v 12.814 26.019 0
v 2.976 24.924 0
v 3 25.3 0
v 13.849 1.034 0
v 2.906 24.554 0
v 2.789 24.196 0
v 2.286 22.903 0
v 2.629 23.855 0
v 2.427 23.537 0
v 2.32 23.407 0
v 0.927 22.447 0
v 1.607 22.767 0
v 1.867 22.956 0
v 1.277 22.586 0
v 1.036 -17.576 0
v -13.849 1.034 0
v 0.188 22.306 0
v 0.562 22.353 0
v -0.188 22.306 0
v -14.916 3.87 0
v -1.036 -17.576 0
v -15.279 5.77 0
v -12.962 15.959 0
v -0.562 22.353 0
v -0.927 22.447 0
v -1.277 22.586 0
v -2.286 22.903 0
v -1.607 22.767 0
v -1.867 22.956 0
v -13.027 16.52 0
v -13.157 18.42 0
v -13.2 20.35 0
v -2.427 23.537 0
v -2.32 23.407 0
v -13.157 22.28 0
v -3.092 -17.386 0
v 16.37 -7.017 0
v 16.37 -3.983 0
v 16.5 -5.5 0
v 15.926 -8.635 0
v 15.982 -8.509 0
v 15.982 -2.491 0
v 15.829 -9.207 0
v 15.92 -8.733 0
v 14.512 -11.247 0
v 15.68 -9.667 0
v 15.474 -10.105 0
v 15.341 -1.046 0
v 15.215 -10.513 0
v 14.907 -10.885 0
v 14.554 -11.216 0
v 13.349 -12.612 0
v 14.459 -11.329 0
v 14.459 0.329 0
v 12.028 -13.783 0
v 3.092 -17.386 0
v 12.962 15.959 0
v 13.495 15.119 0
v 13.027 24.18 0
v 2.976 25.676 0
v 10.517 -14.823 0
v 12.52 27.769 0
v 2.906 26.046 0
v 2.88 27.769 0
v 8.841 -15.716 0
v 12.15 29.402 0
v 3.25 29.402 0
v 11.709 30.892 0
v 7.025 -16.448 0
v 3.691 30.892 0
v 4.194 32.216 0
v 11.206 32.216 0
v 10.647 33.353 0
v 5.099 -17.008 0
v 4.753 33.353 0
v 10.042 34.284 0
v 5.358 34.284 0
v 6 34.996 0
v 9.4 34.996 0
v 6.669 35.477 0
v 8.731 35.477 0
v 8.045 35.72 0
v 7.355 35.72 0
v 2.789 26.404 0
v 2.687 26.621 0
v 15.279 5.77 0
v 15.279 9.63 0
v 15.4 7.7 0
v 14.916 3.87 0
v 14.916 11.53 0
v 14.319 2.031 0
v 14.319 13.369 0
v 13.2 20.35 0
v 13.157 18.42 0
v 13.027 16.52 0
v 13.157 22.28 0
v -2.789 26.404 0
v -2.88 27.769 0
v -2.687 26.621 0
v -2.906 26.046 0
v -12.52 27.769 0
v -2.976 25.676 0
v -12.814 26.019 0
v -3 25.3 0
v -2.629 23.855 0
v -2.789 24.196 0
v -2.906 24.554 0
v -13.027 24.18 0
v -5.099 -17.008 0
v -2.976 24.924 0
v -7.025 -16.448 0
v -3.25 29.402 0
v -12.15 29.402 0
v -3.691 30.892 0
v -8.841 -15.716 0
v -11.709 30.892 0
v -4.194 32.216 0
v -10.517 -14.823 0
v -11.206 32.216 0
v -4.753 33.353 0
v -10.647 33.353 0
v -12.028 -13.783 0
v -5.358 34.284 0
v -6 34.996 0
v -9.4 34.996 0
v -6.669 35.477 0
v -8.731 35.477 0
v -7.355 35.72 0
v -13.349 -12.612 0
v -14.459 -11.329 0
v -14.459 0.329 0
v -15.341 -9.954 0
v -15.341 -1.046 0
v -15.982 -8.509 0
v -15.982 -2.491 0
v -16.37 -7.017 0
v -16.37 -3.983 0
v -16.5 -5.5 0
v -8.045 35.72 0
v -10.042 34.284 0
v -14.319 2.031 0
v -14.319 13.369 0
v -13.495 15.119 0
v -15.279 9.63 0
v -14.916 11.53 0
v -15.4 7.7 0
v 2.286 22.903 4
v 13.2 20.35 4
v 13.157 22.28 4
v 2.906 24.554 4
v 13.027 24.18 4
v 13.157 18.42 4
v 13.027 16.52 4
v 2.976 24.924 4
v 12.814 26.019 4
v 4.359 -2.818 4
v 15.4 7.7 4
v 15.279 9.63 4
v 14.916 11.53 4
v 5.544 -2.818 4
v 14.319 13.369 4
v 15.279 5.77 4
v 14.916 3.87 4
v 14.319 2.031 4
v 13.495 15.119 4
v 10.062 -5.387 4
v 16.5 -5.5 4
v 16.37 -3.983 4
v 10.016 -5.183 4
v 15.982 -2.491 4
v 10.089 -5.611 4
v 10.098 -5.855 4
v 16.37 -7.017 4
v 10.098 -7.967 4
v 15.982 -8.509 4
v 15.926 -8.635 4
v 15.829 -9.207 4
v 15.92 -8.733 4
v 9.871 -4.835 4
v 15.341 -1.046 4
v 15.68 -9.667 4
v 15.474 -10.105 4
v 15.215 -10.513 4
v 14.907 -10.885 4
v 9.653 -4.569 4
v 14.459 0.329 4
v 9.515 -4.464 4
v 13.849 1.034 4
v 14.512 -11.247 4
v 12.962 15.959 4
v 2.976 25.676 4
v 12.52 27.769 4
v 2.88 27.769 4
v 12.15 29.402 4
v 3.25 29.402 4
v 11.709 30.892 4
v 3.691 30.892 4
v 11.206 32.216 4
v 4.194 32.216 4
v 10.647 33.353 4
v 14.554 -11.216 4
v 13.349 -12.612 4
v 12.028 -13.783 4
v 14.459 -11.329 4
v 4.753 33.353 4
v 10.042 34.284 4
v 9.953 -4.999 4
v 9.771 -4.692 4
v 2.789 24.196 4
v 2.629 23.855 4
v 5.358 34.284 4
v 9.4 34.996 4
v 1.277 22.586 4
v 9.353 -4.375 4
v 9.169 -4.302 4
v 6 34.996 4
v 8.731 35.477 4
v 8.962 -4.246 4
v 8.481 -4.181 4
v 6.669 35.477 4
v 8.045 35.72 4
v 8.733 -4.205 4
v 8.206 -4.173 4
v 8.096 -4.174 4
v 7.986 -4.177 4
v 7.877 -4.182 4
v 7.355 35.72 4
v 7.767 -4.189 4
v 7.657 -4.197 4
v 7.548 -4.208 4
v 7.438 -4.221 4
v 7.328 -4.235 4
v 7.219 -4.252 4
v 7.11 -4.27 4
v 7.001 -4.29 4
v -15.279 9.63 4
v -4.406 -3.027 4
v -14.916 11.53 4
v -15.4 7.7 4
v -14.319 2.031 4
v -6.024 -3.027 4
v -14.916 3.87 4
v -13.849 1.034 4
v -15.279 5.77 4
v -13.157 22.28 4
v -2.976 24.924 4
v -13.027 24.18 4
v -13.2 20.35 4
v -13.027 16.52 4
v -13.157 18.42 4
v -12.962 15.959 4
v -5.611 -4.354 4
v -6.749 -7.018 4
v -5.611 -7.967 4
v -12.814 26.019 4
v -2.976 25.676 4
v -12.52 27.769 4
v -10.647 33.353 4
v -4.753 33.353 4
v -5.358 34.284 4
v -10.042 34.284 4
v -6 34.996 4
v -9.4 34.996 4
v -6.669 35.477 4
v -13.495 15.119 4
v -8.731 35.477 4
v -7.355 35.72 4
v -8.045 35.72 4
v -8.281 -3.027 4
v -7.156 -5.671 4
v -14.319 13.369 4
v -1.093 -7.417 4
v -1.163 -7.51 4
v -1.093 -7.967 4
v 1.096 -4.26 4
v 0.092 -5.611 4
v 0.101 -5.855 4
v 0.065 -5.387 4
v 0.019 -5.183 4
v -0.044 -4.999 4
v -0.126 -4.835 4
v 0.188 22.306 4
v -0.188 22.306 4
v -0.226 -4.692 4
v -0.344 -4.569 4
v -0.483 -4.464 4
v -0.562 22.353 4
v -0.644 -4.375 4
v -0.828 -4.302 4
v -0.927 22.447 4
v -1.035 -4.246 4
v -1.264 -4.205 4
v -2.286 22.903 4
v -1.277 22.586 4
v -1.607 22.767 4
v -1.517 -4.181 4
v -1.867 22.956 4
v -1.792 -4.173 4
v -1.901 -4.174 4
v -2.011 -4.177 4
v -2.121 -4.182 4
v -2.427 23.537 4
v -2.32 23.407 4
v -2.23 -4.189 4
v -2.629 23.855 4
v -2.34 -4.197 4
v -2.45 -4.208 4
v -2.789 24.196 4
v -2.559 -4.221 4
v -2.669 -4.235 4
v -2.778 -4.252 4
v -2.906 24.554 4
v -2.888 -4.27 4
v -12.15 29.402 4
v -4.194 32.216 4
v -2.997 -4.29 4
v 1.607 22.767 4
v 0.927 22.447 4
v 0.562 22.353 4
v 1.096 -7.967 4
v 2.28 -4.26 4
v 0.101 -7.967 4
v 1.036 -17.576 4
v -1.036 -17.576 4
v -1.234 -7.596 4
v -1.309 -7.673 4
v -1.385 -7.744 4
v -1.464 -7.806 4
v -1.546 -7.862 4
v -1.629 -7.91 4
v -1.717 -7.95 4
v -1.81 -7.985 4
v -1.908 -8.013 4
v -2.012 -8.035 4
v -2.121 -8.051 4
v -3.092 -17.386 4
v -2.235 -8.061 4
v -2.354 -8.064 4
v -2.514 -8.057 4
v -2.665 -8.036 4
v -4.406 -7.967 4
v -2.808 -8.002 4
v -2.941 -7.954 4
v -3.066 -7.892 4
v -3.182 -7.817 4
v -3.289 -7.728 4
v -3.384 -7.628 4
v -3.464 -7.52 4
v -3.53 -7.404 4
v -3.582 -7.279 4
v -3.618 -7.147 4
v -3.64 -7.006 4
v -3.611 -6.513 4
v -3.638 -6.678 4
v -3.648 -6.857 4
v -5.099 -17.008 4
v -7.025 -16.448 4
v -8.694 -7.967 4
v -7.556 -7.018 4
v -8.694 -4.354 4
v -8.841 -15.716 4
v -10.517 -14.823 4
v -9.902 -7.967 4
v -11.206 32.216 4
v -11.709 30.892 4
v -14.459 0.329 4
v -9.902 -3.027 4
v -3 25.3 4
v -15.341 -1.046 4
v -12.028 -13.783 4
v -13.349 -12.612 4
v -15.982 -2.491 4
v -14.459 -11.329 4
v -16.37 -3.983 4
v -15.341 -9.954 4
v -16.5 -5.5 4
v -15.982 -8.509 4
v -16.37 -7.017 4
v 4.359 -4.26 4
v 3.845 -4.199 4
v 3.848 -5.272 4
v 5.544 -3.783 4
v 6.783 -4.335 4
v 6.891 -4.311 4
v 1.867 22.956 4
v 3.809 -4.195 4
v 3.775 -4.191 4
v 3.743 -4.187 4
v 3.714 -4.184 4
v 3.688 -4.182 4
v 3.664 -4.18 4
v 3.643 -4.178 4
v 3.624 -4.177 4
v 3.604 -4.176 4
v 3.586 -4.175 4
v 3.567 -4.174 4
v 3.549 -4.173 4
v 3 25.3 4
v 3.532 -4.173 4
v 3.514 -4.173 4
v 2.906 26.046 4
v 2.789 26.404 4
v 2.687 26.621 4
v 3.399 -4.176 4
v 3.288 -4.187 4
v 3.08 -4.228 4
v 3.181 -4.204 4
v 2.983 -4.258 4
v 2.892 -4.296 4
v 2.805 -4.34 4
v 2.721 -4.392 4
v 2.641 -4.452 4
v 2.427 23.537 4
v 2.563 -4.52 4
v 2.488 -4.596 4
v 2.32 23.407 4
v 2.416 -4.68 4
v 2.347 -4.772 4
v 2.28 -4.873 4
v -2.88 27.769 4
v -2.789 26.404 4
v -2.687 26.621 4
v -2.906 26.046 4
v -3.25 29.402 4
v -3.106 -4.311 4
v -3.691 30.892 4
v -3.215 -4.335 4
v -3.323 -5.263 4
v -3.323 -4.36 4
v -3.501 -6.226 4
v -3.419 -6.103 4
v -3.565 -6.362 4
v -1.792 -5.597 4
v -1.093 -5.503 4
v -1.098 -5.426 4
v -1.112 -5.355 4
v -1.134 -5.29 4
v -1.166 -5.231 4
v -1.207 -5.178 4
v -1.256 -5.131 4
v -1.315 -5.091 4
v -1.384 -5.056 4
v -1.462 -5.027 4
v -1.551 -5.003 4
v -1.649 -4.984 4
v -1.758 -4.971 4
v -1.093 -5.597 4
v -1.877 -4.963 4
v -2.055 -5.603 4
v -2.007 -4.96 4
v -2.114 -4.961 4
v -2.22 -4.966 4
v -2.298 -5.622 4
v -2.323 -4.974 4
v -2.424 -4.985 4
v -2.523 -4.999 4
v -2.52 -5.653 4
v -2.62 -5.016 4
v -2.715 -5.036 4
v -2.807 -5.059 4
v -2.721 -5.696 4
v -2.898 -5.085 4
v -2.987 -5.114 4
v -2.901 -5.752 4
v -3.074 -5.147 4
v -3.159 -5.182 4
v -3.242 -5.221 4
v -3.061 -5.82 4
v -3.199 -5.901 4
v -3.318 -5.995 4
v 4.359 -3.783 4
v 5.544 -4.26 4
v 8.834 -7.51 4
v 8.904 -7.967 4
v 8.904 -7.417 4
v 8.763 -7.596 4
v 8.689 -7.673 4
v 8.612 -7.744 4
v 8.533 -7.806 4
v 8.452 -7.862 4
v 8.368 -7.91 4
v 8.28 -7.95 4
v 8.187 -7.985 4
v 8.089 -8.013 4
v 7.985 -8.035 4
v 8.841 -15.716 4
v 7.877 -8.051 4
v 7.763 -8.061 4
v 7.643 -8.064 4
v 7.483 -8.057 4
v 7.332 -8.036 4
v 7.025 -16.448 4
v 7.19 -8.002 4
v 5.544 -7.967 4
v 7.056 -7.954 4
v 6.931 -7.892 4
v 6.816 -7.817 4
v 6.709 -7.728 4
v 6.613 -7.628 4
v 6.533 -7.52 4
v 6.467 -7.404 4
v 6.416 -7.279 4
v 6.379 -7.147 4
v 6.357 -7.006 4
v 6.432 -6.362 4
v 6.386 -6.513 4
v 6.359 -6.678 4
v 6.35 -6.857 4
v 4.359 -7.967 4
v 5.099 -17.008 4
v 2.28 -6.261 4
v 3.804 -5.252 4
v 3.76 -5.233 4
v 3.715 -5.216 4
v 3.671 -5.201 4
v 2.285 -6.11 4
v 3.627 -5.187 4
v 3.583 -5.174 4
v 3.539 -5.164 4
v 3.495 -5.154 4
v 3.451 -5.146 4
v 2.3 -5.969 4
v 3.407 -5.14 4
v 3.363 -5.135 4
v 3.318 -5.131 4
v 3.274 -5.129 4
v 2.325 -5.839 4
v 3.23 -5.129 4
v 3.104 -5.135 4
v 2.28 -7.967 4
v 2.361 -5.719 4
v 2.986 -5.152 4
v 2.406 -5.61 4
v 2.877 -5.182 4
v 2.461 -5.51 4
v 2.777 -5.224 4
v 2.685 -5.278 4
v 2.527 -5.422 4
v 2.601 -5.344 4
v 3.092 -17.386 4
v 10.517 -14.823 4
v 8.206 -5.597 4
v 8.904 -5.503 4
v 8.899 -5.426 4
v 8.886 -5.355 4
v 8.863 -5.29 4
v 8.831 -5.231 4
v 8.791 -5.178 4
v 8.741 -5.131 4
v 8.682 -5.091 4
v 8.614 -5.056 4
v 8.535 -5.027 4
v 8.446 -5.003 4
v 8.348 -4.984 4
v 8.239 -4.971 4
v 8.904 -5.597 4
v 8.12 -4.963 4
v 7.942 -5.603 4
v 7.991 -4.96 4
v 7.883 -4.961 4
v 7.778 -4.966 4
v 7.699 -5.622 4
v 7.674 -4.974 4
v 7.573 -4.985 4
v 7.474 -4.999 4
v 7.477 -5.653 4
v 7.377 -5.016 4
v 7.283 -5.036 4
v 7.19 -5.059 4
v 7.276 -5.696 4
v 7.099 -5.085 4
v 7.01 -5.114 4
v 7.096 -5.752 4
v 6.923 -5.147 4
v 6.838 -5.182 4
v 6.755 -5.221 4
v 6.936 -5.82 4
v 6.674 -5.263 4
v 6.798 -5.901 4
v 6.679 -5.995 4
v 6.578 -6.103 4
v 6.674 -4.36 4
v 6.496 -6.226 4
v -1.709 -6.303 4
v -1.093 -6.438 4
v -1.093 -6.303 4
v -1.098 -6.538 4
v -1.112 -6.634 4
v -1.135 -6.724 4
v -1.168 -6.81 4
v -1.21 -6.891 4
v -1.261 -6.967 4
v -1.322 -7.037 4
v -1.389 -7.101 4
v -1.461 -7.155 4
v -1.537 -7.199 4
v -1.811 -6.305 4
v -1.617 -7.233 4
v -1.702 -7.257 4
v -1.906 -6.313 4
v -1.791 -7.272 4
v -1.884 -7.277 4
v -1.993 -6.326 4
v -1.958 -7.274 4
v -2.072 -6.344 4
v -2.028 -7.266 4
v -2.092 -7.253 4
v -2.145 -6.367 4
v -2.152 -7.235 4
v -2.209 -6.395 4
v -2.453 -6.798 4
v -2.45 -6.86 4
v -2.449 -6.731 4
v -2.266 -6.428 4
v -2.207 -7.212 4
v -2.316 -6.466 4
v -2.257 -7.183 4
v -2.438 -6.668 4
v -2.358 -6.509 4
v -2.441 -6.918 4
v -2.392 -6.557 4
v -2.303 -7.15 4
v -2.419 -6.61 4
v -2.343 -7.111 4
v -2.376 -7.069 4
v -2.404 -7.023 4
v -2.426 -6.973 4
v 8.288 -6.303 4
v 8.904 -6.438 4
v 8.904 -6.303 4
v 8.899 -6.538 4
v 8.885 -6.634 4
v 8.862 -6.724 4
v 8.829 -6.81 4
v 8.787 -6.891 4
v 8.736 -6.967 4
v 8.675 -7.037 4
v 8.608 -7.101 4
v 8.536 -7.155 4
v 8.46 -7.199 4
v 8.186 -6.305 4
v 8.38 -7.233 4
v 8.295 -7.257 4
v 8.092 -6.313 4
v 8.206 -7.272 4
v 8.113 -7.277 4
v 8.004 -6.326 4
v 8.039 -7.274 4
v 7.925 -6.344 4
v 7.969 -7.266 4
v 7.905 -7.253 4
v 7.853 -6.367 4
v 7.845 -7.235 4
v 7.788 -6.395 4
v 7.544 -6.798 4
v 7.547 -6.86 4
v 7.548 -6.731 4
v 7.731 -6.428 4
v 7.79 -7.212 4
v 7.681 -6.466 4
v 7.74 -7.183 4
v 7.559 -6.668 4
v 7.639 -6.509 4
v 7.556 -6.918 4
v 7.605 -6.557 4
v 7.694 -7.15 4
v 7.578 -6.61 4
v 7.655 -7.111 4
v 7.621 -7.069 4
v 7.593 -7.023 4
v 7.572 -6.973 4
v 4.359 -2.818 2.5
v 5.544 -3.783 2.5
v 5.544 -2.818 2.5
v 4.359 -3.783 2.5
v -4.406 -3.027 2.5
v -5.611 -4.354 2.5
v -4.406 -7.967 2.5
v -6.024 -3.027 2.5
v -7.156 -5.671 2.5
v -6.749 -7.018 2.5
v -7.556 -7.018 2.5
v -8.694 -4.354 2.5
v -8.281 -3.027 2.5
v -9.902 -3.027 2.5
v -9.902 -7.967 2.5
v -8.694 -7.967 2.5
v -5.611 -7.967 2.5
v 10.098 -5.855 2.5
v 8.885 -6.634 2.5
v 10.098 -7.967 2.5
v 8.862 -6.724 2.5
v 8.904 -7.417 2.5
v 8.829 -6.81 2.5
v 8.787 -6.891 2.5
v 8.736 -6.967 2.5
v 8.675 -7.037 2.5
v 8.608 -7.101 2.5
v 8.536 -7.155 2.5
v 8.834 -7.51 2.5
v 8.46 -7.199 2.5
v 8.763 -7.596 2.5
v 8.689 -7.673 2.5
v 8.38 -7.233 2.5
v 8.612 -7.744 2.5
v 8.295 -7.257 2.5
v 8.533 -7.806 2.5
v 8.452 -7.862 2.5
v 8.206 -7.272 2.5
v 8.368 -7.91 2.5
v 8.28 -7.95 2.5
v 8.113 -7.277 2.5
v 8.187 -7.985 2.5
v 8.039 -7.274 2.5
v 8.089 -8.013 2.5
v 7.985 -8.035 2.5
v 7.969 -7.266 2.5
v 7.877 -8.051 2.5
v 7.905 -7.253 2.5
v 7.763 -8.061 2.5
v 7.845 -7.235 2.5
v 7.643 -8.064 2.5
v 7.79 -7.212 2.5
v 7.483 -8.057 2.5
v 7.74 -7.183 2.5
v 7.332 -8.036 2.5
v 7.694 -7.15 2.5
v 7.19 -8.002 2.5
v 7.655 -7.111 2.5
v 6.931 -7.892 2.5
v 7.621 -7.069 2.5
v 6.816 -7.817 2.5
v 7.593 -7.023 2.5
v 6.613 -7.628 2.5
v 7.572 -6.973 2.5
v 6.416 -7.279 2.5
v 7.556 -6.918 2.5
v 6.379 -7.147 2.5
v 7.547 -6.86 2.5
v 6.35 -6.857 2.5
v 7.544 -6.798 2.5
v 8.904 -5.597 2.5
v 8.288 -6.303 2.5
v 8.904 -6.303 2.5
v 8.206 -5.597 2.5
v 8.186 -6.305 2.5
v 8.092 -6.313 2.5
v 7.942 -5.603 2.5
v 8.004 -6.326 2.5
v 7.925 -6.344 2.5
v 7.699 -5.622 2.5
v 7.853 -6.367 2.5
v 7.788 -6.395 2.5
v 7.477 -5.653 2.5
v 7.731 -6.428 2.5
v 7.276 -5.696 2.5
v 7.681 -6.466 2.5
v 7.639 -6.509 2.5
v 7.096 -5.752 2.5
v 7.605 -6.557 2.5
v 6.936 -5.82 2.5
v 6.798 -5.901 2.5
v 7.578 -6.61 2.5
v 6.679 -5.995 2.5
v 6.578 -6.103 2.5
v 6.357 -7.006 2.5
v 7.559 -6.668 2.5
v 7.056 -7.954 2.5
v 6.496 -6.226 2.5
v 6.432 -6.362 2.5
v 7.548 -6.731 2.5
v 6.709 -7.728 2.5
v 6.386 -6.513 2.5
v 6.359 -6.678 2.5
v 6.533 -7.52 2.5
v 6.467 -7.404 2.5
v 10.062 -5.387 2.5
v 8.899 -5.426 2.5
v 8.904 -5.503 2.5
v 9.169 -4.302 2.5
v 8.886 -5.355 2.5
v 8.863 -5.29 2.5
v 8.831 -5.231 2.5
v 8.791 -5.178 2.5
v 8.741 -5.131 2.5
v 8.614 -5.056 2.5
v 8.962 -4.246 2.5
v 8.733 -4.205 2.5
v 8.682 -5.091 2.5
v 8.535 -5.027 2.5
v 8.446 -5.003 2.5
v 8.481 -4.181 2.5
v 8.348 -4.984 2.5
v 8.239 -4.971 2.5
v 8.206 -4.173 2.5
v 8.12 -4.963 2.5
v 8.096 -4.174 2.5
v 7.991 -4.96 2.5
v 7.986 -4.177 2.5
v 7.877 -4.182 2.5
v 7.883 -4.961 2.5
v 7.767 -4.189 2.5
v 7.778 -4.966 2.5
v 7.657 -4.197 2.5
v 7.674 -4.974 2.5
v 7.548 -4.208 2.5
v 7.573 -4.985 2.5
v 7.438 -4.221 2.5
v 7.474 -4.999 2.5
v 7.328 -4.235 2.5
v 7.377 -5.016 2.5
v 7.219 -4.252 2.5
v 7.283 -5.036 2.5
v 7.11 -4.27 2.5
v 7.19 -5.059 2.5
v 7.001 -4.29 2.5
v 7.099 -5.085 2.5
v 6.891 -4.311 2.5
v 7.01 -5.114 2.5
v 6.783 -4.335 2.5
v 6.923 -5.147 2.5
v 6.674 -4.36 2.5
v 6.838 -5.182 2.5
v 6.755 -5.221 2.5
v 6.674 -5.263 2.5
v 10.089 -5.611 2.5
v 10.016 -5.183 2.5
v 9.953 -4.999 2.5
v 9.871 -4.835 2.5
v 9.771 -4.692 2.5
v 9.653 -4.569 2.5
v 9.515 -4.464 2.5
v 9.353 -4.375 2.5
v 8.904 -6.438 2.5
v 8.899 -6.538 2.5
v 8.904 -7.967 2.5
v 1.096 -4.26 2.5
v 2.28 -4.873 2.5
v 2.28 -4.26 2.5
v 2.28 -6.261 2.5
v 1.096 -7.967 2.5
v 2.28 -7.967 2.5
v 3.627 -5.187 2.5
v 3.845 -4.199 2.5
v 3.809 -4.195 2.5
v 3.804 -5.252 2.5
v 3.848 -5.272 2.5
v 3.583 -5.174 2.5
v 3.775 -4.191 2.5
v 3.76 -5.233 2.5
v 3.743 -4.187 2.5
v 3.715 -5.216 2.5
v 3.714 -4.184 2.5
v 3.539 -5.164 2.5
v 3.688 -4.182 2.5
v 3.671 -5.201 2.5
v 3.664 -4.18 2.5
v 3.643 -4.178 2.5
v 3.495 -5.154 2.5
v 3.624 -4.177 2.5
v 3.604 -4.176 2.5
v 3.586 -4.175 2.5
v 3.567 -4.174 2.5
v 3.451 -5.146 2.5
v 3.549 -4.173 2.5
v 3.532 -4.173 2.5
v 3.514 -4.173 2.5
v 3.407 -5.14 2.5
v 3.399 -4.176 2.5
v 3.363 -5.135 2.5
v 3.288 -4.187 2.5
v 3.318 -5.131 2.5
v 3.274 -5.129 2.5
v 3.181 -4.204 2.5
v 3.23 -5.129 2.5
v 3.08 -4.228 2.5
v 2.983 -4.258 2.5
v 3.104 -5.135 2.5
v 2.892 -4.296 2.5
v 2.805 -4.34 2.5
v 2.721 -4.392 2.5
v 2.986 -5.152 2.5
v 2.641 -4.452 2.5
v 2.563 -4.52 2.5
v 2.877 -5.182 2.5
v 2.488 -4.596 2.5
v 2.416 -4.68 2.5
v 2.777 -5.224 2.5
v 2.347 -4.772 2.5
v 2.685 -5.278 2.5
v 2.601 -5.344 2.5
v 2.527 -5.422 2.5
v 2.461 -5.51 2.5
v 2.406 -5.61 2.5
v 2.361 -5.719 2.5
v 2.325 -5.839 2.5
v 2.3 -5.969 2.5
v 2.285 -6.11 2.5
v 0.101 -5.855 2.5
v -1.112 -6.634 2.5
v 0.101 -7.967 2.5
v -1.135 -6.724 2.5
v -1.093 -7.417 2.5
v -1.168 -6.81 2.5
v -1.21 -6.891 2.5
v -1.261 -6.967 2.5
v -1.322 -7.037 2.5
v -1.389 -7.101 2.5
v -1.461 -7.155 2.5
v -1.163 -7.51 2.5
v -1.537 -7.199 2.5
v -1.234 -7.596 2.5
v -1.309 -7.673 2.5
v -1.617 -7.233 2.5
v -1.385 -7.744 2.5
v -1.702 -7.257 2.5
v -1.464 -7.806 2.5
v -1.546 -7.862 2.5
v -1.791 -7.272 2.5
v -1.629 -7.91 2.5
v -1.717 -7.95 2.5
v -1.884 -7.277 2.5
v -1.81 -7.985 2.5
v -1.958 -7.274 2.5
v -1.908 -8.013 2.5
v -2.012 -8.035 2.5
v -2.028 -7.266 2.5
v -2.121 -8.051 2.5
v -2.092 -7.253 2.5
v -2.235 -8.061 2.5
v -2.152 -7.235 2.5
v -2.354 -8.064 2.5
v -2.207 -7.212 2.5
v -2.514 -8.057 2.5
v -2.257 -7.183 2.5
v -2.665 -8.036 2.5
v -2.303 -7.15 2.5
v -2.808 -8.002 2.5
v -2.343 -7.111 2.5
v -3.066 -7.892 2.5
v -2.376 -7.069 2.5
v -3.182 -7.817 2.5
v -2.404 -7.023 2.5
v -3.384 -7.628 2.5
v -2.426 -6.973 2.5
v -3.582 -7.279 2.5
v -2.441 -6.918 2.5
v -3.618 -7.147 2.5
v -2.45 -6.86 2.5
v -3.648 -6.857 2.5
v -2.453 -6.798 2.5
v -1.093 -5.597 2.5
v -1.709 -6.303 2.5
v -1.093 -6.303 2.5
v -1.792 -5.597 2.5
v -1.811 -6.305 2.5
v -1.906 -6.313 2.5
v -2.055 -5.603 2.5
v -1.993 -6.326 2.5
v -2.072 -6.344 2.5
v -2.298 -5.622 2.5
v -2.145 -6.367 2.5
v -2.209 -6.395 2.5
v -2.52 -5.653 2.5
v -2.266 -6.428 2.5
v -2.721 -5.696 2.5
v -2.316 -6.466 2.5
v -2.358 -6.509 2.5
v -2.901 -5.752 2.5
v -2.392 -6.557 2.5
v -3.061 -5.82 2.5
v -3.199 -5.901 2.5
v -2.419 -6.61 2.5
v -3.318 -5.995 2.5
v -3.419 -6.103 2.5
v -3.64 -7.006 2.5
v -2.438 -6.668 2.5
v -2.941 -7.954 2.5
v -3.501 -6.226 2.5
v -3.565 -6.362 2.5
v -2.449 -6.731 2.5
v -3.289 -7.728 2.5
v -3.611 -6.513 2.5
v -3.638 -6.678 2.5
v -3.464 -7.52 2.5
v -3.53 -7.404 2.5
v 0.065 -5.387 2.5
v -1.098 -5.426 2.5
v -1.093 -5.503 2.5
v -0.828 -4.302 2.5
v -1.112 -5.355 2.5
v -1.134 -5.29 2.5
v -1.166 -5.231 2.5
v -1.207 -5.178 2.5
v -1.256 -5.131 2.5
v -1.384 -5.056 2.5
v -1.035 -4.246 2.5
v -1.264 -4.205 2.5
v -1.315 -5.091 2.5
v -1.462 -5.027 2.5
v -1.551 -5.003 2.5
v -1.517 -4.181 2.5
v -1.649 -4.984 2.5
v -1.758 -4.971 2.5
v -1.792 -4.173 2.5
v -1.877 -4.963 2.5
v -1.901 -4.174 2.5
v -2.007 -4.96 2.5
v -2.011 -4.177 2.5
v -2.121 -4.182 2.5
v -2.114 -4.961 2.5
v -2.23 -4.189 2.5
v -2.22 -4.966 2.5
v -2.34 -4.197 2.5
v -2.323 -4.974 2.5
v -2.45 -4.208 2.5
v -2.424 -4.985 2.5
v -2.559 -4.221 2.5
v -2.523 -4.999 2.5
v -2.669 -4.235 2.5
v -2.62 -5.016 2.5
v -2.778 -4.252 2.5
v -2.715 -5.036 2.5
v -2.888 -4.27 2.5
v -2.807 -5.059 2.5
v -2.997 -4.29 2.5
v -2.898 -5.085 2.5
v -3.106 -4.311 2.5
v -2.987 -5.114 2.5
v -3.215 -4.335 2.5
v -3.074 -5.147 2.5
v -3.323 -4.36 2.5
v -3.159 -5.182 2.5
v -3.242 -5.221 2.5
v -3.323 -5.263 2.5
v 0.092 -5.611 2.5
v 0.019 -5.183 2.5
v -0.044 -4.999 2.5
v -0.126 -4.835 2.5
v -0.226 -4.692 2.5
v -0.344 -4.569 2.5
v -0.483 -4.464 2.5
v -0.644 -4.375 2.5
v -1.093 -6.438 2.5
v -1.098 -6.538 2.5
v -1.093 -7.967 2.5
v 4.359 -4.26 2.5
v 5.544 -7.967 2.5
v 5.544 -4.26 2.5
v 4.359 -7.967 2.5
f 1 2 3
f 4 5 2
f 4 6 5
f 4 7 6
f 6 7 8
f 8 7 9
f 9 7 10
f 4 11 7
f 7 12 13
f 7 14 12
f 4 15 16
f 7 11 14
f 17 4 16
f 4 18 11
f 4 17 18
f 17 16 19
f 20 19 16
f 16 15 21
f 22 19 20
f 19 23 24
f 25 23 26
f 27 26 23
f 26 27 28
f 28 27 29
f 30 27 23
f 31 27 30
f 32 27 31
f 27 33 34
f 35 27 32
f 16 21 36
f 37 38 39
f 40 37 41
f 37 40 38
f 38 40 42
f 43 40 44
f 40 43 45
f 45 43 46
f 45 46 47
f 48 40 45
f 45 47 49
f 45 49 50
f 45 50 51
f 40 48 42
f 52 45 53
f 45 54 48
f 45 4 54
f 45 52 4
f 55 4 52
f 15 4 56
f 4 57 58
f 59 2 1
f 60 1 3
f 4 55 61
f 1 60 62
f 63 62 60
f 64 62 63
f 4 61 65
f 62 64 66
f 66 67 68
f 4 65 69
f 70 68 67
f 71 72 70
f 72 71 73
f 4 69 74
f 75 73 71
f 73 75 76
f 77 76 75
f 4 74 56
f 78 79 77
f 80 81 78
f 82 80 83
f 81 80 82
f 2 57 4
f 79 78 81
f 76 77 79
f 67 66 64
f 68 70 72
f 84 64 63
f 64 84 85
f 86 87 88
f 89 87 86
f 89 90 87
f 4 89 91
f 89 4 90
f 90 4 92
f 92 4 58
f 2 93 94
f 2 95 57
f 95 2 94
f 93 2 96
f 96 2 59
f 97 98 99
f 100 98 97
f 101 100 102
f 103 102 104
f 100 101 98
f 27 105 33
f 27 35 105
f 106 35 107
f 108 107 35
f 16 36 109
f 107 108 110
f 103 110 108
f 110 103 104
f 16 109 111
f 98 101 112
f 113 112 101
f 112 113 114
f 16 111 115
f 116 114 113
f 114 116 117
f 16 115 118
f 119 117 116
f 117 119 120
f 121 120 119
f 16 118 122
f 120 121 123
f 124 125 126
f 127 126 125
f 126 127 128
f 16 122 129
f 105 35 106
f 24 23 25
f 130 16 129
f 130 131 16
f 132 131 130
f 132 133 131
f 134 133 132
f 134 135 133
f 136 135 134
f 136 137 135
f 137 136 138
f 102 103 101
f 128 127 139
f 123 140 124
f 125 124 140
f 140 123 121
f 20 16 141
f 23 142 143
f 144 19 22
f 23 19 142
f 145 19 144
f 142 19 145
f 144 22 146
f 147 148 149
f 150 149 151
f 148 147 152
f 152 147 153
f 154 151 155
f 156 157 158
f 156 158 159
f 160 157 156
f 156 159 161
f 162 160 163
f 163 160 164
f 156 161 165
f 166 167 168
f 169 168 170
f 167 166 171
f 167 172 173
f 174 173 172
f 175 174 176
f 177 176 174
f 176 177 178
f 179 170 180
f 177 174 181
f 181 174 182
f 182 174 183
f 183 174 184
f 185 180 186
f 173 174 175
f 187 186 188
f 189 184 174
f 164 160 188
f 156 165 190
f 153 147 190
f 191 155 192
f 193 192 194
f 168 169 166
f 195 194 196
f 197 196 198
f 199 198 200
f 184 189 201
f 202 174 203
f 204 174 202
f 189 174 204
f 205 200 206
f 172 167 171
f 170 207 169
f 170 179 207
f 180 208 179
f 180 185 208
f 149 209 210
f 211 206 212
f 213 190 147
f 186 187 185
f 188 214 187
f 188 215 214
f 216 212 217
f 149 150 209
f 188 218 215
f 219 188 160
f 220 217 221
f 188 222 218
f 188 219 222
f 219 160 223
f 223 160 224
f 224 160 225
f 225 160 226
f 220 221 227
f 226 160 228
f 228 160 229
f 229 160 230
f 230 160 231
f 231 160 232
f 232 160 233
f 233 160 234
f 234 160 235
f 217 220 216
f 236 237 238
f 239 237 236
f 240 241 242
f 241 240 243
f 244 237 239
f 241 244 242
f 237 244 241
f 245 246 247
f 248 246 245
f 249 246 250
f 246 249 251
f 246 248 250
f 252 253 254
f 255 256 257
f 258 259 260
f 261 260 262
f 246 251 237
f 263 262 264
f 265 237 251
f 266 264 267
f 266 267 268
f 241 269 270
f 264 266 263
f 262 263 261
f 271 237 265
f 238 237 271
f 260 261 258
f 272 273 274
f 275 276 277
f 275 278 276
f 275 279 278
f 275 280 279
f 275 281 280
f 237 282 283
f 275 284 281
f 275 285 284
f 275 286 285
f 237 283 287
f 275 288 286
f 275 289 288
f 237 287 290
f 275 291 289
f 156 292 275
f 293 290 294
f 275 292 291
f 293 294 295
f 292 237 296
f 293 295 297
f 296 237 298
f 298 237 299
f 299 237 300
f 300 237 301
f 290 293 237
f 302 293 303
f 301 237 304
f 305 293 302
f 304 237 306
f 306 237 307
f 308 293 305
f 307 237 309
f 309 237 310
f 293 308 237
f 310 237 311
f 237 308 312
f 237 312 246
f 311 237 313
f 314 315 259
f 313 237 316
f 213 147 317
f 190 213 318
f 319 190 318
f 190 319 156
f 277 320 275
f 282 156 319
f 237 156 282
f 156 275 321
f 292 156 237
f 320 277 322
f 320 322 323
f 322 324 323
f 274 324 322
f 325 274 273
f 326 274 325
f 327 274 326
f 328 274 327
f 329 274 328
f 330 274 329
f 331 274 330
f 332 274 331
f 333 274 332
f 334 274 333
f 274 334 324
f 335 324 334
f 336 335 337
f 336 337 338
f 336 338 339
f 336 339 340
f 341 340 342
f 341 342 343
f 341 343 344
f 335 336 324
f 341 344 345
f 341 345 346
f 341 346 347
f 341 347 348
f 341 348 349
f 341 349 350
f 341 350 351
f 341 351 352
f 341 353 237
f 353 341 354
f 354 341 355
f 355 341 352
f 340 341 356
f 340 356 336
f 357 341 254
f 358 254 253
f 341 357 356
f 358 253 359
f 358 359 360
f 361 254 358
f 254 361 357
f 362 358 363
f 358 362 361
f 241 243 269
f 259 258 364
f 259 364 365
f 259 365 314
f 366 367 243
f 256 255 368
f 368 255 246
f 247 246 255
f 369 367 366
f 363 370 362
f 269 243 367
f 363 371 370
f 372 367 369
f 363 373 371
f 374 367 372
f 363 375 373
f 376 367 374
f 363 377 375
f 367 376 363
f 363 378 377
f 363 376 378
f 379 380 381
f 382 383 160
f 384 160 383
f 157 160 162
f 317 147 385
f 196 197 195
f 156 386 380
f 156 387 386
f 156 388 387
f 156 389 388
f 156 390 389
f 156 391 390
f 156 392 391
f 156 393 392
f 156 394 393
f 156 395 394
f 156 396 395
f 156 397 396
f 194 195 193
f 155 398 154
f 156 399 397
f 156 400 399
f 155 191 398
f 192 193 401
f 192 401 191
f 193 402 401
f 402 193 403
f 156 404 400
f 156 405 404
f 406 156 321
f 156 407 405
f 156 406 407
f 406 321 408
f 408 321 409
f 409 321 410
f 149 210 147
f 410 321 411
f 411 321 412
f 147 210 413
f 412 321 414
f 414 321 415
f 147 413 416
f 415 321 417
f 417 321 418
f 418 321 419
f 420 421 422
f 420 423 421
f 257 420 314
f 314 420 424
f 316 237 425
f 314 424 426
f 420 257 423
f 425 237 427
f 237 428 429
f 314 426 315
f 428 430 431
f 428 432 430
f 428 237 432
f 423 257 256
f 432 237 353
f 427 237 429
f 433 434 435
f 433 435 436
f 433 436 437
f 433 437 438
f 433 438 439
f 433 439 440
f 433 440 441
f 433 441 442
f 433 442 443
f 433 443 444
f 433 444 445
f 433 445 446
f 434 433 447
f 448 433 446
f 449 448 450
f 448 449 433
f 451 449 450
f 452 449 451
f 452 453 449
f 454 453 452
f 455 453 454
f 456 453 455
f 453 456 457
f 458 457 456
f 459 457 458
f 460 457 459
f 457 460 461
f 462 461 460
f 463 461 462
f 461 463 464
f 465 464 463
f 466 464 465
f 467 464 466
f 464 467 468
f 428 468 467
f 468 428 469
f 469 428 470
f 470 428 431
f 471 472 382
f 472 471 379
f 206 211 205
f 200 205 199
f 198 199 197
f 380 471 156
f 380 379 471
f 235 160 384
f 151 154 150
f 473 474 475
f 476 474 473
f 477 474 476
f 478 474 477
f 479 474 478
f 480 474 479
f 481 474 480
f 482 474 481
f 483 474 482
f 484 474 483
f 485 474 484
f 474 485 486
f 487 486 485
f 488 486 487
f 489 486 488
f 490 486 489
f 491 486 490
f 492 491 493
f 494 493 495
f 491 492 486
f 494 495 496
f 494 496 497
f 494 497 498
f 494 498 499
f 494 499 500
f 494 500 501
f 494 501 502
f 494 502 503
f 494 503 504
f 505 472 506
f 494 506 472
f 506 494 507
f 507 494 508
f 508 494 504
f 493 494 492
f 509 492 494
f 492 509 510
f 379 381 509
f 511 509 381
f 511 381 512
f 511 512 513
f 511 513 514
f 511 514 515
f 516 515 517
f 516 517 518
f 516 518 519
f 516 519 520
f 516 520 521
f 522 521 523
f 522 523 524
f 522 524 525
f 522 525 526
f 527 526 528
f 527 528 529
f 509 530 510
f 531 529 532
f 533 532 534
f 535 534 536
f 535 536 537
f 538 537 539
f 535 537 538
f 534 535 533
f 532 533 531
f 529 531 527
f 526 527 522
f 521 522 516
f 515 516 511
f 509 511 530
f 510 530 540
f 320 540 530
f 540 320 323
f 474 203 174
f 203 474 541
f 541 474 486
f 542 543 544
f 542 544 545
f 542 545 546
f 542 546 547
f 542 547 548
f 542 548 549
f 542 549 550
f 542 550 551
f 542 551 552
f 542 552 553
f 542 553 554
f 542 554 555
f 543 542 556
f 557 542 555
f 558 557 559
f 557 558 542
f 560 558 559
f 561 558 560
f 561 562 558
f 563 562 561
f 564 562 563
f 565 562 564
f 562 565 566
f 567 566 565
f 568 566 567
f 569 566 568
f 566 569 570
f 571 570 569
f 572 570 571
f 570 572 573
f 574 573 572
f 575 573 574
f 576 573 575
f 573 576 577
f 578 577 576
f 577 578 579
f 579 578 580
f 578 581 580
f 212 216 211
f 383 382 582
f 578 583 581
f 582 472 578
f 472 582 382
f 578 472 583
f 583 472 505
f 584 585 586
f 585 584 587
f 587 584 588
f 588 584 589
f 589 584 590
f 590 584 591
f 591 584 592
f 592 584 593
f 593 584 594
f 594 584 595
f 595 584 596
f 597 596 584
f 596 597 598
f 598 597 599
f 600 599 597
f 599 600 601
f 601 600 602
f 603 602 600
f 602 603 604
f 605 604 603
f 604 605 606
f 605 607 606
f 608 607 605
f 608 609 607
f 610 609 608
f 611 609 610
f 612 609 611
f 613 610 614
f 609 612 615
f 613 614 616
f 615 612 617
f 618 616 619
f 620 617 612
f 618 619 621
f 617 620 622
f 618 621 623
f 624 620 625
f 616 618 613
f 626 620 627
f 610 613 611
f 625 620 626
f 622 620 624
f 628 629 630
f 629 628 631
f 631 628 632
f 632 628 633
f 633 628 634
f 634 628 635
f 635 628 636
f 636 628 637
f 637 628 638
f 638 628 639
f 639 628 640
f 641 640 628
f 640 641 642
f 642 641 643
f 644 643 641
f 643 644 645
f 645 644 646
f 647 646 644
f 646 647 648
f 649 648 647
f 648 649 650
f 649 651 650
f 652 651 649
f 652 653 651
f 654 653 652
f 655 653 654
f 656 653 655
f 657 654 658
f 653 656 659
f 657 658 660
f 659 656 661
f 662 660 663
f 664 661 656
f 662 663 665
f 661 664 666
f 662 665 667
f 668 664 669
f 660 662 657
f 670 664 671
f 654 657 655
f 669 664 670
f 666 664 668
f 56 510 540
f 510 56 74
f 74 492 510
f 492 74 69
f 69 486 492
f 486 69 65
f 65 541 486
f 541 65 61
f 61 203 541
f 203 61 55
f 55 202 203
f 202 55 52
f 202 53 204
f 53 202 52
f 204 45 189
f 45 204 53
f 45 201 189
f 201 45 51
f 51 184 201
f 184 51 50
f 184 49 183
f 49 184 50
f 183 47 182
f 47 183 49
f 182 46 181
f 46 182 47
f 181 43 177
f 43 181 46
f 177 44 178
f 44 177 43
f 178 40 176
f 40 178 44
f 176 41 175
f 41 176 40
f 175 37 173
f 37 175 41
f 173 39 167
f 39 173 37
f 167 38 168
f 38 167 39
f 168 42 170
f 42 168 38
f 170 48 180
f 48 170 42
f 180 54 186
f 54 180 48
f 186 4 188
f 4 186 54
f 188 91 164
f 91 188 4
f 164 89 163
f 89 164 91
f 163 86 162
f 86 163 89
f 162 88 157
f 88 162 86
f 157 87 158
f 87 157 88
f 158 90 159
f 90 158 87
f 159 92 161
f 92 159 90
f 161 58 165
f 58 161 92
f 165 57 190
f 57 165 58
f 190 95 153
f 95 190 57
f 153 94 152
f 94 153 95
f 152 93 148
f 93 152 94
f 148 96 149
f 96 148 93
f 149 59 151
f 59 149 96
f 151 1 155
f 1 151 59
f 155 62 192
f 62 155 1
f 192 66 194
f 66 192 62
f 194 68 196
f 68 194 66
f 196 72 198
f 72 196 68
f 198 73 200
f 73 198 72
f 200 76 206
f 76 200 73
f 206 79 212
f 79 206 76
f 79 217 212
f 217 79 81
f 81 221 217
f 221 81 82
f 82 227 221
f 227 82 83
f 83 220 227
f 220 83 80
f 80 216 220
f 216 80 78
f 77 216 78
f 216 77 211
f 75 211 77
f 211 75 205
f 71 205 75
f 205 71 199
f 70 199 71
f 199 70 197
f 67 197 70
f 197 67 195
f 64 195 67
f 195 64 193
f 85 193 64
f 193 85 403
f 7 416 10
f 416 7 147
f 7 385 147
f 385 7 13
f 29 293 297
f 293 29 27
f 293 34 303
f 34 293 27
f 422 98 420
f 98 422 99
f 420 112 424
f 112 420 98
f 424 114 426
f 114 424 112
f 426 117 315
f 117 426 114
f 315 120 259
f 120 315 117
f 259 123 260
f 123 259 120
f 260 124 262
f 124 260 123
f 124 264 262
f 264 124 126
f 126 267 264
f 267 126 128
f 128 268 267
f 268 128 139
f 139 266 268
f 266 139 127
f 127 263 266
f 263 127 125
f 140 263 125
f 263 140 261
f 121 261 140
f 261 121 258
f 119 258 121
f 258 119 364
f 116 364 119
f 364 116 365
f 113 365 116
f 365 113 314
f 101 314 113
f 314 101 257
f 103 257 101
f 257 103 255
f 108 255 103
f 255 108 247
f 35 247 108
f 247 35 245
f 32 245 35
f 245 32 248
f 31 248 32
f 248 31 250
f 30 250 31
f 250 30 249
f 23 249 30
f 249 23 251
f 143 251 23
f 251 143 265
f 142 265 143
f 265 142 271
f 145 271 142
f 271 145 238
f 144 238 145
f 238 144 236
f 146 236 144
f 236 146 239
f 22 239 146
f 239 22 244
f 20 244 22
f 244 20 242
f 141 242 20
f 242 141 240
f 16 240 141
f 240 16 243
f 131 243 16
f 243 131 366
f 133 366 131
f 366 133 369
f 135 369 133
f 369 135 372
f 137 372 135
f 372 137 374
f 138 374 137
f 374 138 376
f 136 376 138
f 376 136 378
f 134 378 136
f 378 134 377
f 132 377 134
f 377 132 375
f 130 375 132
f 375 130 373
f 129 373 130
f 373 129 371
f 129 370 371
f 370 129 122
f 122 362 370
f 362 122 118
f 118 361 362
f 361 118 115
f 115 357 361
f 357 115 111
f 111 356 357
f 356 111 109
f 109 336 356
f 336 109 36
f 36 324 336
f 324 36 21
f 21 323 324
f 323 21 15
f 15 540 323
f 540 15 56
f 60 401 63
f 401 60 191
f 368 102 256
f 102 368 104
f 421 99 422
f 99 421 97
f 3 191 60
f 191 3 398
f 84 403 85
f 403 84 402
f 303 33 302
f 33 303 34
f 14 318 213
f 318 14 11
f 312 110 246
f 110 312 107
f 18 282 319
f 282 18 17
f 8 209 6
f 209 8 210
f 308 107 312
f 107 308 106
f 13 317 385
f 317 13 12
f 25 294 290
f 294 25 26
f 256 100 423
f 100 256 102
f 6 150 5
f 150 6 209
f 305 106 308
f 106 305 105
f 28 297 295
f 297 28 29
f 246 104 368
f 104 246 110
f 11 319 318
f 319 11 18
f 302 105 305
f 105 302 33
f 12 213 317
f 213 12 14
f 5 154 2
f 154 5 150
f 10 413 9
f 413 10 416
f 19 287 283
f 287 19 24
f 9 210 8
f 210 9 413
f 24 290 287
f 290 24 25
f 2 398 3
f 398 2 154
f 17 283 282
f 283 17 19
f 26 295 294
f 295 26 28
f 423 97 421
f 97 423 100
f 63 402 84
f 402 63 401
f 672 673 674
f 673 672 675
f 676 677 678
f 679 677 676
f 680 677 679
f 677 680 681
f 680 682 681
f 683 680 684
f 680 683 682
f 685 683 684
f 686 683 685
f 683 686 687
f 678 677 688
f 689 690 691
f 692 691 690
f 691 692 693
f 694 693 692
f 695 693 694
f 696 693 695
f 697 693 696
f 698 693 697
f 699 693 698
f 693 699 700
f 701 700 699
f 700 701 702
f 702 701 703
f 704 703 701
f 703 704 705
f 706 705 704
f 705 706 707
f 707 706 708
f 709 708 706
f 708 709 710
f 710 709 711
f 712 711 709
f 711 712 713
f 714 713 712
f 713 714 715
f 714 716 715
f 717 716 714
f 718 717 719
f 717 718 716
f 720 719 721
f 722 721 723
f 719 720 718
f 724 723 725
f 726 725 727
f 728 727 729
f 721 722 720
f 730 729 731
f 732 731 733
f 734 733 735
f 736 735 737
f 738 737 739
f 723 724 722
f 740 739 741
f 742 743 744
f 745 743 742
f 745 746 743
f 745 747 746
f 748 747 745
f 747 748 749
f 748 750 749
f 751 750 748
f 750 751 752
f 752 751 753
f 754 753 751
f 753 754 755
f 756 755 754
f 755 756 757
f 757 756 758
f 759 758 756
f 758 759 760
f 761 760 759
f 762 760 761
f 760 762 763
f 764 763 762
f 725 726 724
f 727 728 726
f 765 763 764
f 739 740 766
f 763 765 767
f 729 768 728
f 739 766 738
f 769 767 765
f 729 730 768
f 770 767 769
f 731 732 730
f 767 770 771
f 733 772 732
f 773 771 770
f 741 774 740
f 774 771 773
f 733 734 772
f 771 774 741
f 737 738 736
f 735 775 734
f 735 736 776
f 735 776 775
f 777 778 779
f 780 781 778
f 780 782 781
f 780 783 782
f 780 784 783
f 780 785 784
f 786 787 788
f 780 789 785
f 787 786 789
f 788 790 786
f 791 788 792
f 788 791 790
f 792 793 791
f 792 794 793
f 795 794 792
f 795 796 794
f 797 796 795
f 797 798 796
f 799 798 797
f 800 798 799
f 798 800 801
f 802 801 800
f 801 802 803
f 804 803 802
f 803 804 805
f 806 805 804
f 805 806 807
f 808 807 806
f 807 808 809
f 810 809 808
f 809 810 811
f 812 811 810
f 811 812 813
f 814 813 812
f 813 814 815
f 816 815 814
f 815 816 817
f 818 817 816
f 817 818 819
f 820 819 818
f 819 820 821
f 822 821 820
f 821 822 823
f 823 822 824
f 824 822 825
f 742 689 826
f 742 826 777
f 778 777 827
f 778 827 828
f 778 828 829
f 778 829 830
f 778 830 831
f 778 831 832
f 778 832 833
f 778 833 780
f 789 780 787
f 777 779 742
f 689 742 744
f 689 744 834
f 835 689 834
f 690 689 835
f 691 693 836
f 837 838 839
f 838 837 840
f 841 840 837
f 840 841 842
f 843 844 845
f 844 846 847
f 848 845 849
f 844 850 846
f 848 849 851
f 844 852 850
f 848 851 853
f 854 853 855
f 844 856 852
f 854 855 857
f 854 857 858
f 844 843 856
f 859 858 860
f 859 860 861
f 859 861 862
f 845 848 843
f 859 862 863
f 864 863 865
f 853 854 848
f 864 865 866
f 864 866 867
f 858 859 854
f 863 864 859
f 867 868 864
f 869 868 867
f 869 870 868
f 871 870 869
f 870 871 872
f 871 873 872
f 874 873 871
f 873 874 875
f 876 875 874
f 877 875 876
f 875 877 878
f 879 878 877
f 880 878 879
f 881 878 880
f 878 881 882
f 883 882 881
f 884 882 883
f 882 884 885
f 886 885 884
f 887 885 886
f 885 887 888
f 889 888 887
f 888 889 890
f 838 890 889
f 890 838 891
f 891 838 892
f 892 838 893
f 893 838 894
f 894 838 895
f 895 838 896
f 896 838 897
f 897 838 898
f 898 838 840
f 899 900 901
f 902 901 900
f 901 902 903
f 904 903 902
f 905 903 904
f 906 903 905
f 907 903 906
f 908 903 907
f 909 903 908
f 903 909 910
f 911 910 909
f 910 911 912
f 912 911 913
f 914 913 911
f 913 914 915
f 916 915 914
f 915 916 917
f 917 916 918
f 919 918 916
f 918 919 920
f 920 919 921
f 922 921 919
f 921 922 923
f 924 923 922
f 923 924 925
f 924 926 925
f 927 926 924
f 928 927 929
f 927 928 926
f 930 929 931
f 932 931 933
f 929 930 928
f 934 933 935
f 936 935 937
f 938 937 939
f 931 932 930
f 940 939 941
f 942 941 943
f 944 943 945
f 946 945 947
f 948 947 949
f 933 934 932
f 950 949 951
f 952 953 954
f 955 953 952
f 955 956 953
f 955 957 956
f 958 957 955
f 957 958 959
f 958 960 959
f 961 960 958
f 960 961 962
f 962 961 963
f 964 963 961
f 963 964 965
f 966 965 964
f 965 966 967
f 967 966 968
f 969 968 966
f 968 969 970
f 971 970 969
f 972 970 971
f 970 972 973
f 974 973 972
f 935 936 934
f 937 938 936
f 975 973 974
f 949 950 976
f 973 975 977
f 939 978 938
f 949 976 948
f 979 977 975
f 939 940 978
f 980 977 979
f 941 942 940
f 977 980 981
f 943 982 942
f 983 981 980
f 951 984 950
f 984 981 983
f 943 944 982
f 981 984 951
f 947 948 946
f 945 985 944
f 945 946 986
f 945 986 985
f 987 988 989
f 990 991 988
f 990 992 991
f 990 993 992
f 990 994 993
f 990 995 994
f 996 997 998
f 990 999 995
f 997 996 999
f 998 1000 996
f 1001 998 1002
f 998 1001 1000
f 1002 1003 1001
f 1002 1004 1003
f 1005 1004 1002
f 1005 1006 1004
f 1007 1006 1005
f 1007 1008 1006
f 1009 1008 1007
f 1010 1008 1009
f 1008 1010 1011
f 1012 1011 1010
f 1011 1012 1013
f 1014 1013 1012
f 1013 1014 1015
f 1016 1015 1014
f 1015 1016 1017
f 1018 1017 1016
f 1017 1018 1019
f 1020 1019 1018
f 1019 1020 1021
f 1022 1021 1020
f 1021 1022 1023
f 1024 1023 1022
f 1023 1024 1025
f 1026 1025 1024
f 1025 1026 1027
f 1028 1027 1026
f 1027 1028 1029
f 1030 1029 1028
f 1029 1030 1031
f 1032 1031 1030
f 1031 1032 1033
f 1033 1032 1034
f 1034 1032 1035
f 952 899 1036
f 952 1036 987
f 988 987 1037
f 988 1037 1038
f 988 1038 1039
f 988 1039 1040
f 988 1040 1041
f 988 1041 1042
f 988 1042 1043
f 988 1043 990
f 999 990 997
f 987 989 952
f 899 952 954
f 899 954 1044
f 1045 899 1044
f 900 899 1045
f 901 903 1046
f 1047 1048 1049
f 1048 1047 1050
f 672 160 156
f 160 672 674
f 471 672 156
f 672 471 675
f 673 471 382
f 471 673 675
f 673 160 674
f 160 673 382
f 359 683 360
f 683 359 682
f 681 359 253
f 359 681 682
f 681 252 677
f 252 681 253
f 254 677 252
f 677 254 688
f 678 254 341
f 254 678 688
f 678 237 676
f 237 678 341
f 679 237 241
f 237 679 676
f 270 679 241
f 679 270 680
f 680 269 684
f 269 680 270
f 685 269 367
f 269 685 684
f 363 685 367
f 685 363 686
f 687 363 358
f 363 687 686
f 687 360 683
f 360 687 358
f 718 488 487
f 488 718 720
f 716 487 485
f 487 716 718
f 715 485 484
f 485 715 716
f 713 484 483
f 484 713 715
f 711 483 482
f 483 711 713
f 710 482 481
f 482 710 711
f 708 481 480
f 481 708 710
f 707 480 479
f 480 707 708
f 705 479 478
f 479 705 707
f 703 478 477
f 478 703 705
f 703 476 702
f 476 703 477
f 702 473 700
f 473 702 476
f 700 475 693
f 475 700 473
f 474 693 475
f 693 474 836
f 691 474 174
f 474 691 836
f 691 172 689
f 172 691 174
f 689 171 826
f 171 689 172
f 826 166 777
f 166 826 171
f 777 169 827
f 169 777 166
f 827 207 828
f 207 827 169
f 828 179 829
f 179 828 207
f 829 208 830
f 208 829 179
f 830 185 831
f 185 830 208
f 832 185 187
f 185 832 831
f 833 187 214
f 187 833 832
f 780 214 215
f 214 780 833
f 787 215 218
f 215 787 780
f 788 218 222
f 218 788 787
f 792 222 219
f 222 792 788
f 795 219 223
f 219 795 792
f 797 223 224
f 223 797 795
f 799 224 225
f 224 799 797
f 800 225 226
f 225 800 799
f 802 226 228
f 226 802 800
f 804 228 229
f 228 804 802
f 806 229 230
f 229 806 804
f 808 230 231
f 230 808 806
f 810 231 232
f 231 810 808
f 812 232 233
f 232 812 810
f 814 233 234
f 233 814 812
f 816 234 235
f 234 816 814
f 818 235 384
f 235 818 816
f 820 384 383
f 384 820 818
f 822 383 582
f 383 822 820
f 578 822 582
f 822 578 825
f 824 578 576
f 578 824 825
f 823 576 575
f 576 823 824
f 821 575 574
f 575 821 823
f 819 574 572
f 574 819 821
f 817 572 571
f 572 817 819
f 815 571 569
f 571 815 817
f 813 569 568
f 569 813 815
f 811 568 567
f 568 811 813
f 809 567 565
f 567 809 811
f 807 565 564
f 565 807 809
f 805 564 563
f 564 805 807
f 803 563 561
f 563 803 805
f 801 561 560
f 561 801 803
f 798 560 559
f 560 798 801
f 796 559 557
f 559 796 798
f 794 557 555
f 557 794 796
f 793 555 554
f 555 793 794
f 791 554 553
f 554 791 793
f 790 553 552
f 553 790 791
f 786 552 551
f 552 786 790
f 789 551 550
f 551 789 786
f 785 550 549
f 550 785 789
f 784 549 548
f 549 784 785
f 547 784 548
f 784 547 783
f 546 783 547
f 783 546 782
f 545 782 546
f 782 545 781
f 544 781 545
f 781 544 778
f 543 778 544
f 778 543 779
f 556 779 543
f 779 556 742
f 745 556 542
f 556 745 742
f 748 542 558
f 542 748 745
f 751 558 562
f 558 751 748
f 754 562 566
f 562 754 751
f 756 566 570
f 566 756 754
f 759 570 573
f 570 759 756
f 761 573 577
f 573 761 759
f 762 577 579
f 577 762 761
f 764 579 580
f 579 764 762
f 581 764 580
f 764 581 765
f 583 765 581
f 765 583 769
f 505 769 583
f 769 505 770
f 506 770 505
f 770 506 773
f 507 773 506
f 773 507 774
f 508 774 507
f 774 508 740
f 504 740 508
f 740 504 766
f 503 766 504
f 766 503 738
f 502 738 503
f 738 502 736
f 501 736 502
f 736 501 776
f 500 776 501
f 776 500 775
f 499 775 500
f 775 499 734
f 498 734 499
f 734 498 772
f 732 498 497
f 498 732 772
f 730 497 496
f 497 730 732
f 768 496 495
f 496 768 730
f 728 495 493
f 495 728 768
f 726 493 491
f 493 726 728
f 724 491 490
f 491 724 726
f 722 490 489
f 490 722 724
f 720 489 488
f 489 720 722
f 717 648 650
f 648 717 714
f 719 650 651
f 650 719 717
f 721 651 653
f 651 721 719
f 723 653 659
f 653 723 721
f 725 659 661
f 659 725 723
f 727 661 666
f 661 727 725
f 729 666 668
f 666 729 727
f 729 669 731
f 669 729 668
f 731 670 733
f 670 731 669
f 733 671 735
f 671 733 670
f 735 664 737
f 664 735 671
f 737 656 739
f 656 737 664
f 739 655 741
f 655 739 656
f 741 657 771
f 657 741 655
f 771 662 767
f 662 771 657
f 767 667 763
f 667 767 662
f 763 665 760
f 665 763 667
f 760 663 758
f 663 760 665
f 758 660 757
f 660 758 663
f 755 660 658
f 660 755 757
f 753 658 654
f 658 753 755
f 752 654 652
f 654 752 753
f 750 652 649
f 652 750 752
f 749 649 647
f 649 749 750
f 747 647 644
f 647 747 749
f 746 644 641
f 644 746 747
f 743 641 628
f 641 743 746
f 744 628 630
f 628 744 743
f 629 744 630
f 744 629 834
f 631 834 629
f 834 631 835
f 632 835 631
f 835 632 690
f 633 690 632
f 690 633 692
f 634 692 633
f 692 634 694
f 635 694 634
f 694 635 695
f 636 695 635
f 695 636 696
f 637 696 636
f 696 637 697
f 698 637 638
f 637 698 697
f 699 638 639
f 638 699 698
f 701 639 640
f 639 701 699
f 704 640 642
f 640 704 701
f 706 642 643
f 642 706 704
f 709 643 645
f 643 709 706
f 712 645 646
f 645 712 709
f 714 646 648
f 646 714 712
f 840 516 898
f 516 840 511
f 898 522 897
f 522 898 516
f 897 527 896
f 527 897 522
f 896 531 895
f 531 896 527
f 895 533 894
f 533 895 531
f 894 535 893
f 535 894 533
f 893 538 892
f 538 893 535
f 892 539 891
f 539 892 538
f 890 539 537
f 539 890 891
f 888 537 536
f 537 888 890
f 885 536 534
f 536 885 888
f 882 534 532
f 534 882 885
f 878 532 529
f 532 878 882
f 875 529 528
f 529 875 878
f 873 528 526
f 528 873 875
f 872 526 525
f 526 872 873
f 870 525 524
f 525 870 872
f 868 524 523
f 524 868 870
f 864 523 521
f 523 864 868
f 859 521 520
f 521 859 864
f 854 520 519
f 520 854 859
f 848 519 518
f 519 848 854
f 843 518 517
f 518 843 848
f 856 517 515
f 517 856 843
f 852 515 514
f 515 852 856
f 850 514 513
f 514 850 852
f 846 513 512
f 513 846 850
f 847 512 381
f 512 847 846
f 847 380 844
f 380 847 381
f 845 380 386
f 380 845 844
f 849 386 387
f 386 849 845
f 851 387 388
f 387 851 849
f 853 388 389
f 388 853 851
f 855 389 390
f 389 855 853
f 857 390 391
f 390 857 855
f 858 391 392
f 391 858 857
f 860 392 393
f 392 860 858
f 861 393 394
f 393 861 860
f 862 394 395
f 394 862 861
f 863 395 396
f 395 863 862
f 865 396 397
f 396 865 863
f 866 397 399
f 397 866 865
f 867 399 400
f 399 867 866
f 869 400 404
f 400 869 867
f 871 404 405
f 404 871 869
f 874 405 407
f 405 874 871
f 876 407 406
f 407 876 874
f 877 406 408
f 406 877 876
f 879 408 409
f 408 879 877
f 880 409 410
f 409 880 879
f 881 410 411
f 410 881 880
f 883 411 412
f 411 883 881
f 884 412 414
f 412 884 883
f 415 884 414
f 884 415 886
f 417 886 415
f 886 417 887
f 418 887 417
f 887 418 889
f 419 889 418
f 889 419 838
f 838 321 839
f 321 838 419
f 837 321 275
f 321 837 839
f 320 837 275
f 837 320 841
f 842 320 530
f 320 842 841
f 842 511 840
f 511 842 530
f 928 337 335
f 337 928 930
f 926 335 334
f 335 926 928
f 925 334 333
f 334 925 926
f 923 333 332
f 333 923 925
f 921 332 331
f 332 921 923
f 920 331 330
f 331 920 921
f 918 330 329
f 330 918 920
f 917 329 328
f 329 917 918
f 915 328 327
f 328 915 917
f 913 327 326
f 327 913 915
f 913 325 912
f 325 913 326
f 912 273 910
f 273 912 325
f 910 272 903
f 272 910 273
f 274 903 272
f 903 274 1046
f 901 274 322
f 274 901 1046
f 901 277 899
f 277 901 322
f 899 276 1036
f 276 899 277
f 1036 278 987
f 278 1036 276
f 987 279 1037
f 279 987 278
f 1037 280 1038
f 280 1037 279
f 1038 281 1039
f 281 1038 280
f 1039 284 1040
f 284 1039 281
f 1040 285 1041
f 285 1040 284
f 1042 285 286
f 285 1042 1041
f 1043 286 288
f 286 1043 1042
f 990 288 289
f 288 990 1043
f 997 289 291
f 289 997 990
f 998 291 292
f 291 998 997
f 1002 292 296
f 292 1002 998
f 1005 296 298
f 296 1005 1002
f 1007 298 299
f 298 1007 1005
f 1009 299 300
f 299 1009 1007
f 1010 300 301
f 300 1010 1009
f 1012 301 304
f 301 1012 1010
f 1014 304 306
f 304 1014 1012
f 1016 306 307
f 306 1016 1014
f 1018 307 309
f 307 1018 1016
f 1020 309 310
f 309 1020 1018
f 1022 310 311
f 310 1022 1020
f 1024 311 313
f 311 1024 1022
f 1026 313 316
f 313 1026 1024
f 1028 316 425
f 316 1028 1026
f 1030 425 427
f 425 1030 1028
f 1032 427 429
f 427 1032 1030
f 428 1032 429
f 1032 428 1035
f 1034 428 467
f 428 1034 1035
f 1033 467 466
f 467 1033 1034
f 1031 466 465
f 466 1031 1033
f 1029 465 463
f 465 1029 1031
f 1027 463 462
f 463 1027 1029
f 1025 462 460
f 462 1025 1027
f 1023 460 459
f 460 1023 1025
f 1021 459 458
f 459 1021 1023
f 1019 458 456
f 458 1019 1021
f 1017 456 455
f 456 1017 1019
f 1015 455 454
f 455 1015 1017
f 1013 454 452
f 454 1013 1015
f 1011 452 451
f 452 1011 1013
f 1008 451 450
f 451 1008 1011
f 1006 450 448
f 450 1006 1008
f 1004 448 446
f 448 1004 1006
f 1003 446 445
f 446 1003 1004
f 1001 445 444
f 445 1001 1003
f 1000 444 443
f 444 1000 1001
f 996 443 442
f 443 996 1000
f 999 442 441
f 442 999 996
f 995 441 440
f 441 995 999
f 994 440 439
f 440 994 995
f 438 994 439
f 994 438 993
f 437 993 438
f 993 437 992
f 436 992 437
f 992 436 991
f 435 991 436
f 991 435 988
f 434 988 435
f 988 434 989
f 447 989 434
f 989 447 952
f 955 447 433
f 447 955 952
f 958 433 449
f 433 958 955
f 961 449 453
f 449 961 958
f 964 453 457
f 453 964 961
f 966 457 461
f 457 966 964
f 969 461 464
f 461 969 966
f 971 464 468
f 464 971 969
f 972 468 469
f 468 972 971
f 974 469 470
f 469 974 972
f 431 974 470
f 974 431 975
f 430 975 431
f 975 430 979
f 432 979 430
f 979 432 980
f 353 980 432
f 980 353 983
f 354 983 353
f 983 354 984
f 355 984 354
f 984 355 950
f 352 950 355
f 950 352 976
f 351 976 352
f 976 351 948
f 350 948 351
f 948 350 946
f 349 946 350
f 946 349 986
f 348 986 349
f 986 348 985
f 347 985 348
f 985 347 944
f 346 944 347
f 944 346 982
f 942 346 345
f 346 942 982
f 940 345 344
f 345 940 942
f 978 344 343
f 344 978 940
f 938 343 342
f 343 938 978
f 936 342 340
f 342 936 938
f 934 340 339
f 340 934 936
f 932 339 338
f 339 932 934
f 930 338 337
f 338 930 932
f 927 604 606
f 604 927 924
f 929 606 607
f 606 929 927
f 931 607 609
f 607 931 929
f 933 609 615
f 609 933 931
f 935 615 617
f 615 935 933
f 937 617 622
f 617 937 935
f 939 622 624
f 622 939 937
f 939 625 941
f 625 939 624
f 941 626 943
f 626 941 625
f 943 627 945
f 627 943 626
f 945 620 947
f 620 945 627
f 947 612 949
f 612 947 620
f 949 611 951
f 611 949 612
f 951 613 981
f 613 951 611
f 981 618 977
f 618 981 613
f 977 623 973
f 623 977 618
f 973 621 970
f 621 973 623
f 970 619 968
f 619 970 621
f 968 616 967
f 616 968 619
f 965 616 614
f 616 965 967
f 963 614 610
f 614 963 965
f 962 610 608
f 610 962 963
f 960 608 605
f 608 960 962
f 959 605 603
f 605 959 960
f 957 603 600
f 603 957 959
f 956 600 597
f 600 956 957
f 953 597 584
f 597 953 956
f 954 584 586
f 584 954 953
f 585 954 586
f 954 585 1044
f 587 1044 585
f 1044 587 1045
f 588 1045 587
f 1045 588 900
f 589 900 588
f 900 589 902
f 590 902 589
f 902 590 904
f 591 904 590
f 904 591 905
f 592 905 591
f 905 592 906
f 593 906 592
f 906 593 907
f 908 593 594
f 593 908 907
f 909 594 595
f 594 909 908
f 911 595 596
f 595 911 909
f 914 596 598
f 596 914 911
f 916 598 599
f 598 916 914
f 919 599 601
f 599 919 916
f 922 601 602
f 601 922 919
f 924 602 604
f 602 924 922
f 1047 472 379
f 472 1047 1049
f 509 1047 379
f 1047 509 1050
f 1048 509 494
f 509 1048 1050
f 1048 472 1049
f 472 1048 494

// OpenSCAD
// Bunny Name Keychain
// Bunny-shaped keychain with personalized name

// --- Parameters ---
Name         = "Maria";
Font         = "Bebas Neue";
Name_Size    = 20;
Bunny_Size   = 55;
Thickness    = 4;
Ring_Hole_D  = 6;
Text_Depth   = 1.5;

$fn = 50;

module name_shape(txt, fnt) {
  resize([Name_Size, 0, 0], auto=true)
  text(txt, size=10, font=fnt, halign="center", valign="center");
}

module bunny_2d(sz) {
  head_r  = sz * 0.28;
  ear_rx  = sz * 0.10;
  ear_ry  = sz * 0.28;
  body_rx = sz * 0.30;
  body_ry = sz * 0.22;

  union() {
    // Body
    translate([0, -sz * 0.10])
    scale([body_rx, body_ry]) circle(1);

    // Head
    translate([0, sz * 0.14])
    circle(r=head_r);

    // Left ear
    translate([-sz * 0.14, sz * 0.37])
    scale([ear_rx, ear_ry]) circle(1);

    // Right ear
    translate([sz * 0.14, sz * 0.37])
    scale([ear_rx, ear_ry]) circle(1);

    // Tail
    translate([sz * 0.22, -sz * 0.15])
    circle(r=sz * 0.07);
  }
}

difference() {
  linear_extrude(Thickness)
  bunny_2d(Bunny_Size);

  // Ring hole at top of ear
  translate([0, Bunny_Size * 0.46, -0.5])
  linear_extrude(Thickness + 1)
  circle(d=Ring_Hole_D);

  // Engraved name on body
  translate([0, -Bunny_Size * 0.10, Thickness - Text_Depth])
  linear_extrude(Text_Depth + 0.5)
  name_shape(Name, str(Font, ":style=Bold"));
}
